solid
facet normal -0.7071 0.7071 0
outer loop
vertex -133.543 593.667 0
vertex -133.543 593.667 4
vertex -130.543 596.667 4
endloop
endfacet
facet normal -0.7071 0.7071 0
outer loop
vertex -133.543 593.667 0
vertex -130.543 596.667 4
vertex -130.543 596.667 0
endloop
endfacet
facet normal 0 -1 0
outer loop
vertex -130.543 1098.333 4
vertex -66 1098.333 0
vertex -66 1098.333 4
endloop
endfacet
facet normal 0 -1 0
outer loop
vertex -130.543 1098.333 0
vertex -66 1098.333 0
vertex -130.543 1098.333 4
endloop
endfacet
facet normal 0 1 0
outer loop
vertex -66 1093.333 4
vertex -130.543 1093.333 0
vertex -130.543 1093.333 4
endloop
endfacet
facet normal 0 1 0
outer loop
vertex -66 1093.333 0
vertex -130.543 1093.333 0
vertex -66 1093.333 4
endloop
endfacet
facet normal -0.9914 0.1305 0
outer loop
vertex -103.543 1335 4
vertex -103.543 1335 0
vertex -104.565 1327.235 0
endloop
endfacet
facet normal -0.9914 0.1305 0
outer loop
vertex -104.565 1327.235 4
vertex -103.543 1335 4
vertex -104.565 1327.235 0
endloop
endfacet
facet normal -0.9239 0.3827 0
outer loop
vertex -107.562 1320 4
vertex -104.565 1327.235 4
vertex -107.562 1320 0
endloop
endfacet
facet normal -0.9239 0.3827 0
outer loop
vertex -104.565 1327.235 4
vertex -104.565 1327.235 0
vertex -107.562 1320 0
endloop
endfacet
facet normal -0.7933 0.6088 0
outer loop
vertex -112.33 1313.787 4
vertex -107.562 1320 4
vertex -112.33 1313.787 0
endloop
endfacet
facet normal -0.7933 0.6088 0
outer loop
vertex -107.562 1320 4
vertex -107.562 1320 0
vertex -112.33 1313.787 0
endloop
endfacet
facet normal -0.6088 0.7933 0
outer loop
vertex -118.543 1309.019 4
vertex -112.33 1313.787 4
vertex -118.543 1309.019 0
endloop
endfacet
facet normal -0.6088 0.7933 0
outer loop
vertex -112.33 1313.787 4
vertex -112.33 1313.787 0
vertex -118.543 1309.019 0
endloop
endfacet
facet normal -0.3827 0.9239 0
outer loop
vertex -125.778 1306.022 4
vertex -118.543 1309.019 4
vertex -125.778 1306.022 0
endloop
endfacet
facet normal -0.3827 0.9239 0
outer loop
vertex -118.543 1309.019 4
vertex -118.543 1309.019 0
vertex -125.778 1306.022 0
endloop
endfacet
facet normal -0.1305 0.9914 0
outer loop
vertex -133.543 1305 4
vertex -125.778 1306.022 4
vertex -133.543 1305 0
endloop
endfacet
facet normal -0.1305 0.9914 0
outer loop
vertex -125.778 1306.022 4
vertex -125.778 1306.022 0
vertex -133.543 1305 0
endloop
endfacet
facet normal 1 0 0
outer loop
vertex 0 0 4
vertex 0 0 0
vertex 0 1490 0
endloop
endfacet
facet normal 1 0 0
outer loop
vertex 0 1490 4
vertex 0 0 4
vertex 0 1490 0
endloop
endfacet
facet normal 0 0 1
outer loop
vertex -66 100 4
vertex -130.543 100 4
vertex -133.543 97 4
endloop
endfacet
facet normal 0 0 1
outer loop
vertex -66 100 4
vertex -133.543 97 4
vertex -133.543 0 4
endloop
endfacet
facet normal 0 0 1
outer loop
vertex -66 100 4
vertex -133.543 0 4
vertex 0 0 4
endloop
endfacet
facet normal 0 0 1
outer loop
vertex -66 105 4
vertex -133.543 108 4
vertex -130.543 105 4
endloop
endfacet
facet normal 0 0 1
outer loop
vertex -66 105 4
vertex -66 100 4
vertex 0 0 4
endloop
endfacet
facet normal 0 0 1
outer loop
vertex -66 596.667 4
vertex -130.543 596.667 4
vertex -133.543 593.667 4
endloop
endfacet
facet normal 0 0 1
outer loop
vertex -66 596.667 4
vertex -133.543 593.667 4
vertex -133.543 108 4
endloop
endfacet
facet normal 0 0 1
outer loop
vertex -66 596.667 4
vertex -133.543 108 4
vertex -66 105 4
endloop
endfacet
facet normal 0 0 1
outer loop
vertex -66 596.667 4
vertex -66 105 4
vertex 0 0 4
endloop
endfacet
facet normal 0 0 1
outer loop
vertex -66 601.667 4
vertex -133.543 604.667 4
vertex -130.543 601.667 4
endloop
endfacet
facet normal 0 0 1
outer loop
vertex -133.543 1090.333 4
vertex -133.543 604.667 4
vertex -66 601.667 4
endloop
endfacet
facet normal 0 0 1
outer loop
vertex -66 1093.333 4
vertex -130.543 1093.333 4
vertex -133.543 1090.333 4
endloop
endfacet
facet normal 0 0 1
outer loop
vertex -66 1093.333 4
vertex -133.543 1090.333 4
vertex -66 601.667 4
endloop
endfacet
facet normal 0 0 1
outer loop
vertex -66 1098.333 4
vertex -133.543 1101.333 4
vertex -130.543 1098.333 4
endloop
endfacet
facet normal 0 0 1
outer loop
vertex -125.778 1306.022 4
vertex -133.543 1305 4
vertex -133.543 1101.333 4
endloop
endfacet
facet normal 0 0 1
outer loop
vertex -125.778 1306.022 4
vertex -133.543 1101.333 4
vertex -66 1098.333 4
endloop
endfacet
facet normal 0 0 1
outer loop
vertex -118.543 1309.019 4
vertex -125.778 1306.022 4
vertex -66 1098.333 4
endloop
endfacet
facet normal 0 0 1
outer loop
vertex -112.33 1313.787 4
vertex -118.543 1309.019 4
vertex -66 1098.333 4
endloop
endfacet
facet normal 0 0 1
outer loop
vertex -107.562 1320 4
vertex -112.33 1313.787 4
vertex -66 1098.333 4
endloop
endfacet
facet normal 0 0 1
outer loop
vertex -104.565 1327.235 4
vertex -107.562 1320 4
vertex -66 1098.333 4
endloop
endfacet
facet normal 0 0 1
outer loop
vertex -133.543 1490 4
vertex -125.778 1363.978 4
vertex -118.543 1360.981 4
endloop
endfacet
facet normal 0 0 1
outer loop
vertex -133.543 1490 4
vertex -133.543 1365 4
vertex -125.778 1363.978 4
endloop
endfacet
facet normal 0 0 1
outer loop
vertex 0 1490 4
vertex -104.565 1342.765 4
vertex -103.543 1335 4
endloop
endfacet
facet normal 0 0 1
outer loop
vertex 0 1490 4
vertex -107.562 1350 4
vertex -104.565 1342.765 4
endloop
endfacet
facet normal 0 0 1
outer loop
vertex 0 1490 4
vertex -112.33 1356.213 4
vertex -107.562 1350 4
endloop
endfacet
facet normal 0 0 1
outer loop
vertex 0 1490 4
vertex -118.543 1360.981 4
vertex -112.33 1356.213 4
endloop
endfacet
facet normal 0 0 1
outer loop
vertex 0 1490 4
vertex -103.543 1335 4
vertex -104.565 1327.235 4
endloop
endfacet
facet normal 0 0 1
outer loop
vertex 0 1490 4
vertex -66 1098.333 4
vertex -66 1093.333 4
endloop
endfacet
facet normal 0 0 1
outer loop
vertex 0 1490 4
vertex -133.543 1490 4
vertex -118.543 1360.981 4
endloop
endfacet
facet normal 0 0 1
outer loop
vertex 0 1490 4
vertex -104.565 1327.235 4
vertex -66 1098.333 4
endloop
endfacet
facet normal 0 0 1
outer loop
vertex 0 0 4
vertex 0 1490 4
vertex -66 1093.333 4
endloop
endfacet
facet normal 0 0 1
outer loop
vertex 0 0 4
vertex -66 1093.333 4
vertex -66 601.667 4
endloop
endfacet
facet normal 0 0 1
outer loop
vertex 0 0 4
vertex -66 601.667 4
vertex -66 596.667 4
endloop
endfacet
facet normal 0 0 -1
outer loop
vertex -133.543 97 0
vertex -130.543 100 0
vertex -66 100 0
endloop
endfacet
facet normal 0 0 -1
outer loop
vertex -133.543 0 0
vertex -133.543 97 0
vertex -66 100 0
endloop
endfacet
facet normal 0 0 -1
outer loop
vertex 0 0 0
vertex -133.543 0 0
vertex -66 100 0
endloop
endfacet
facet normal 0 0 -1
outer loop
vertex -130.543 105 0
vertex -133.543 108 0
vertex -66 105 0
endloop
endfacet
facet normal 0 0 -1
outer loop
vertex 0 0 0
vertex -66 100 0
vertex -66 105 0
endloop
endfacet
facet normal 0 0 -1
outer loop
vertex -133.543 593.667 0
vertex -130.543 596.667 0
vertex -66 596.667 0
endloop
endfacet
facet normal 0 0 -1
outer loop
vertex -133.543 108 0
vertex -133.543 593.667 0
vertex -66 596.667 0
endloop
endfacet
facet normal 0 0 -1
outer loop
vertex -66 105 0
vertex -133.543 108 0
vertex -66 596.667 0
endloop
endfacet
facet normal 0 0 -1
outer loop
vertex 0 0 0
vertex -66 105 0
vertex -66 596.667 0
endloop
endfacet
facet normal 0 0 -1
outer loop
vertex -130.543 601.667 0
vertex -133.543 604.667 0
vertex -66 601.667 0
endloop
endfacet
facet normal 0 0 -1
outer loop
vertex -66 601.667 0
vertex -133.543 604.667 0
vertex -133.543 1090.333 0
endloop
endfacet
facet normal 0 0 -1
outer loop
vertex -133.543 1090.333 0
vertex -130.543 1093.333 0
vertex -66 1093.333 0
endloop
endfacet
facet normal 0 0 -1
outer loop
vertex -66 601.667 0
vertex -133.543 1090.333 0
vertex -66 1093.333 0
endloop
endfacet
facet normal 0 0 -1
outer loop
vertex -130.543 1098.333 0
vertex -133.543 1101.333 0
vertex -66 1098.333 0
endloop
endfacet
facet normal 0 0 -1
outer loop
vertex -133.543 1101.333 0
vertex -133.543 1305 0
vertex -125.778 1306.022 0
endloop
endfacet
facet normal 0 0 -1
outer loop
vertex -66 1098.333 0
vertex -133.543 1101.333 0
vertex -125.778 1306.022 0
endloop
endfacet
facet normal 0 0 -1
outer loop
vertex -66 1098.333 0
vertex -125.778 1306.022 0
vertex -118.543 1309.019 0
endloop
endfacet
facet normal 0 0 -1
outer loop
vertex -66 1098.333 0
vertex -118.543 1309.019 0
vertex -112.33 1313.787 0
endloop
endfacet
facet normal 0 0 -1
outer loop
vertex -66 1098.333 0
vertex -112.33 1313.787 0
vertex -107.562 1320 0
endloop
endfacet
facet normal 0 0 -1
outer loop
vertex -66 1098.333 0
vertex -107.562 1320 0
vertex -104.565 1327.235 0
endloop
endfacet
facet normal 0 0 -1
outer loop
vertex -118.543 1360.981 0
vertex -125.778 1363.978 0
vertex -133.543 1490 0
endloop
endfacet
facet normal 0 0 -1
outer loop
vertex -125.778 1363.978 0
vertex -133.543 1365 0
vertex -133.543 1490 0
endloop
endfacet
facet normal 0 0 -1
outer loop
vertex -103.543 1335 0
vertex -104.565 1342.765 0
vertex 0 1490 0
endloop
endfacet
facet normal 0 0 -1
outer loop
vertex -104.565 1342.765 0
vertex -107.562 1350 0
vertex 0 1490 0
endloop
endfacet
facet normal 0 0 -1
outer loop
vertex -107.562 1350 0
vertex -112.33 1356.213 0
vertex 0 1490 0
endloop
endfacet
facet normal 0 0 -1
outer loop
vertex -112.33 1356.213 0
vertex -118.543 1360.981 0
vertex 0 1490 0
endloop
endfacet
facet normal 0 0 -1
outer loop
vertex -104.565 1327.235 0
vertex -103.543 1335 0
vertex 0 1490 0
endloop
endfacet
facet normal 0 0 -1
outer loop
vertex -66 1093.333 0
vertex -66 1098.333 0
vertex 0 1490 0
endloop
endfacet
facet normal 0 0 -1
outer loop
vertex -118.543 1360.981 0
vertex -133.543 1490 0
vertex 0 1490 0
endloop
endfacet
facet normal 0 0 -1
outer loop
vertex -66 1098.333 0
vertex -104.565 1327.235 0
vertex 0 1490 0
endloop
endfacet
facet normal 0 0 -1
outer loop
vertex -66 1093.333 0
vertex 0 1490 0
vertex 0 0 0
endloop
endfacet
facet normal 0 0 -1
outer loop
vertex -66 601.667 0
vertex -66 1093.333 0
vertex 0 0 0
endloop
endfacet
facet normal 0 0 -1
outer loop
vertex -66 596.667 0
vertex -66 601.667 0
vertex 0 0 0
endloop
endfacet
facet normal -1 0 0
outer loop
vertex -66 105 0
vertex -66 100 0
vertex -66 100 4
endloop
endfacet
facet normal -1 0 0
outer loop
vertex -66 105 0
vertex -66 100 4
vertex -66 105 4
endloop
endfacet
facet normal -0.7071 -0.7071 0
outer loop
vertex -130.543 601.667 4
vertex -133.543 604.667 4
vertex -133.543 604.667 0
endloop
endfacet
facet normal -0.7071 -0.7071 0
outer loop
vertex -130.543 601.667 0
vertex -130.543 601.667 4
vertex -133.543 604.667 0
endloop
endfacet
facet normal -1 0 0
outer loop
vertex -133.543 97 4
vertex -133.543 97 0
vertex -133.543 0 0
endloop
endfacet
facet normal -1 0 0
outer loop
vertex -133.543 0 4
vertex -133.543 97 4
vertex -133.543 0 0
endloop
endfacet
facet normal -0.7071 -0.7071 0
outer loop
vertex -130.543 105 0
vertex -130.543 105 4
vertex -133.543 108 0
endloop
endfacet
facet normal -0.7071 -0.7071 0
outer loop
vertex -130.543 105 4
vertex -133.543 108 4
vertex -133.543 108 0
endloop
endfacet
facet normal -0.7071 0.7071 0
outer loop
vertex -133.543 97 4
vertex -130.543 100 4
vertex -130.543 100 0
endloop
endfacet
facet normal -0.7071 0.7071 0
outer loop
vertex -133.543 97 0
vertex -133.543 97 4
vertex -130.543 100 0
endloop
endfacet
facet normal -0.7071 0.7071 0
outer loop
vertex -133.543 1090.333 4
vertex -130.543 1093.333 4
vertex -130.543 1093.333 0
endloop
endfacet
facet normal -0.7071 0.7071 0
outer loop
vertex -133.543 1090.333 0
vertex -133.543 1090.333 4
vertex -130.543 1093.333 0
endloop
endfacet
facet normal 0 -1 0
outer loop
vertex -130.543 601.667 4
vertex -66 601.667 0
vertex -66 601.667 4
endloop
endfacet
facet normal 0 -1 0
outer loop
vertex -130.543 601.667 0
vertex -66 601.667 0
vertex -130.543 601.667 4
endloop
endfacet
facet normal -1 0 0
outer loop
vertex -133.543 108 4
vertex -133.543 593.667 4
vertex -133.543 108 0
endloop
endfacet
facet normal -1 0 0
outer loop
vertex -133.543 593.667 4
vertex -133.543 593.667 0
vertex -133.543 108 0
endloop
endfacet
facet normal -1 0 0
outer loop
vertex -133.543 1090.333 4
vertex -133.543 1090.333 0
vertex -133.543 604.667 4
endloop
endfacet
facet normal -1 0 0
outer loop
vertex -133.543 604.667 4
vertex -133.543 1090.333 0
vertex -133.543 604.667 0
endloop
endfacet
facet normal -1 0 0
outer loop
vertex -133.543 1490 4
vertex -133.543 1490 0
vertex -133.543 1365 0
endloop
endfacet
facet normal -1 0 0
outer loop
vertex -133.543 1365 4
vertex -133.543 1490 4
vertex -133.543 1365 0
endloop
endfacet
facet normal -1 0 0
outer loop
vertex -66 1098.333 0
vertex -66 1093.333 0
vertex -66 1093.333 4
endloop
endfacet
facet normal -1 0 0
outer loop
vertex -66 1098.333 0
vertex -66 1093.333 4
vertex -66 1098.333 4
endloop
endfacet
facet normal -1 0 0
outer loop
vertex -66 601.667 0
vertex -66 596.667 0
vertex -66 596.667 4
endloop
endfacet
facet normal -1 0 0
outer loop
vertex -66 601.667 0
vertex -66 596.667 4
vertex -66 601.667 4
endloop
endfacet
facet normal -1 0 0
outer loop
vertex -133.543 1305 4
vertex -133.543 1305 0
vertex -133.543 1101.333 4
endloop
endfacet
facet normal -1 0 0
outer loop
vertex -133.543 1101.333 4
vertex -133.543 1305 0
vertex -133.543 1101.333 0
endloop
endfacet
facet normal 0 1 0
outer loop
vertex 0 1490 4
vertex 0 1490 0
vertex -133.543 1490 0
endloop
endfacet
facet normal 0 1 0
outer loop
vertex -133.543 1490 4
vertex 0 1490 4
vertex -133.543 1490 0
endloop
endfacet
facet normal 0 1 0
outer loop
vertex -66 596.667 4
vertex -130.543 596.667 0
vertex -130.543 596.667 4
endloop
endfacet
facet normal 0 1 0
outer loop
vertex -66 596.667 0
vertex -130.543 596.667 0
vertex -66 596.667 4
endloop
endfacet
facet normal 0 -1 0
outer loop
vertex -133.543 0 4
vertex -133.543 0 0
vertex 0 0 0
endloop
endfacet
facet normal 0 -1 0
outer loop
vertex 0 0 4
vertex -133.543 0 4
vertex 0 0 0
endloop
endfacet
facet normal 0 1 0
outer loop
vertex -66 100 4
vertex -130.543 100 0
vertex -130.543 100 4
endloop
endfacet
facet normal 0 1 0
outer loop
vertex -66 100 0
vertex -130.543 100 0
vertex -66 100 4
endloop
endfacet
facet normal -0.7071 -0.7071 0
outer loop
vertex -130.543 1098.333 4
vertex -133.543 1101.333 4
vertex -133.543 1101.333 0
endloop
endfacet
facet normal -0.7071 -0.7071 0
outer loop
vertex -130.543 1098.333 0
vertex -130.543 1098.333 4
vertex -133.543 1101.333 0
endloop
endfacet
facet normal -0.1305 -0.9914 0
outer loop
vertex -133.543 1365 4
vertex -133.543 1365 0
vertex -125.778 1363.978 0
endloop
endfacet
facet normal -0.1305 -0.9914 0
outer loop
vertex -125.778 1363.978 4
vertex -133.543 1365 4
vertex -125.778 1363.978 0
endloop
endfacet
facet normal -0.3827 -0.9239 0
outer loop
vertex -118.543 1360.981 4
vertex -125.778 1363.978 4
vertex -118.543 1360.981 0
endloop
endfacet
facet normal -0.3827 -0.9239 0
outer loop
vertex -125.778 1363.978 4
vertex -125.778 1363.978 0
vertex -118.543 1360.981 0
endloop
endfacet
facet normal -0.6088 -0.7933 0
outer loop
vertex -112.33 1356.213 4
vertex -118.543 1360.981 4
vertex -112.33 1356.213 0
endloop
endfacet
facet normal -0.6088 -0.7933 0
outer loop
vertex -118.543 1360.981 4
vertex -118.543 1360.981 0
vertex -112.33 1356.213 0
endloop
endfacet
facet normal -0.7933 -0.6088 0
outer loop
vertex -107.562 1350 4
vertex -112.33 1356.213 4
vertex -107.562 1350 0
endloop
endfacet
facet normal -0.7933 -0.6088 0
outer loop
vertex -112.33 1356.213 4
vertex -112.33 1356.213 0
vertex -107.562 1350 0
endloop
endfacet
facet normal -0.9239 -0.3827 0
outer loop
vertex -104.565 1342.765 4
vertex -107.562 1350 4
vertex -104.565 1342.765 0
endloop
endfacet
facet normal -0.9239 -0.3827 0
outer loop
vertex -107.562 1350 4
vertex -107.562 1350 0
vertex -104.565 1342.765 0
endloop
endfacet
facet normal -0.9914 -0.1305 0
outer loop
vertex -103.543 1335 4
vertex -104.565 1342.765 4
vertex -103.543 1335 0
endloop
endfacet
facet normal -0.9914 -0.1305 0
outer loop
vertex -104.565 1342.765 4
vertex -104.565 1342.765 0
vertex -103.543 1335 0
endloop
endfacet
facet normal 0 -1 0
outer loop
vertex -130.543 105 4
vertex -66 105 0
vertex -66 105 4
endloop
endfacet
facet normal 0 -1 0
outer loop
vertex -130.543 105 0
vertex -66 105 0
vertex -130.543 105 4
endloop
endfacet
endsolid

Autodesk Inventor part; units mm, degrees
ref_plane "YZ Plane" through (0, 0, 0) normal (1, 0, 0) x (0, 1, 0)
ref_plane "XZ Plane" through (0, 0, 0) normal (0, 1, 0) x (-1, 0, 0)
ref_plane "XY Plane" through (0, 0, 0) normal (0, 0, 1) x (1, 0, 0)
sketch "Sketch1" plane through (0, 0, 0) normal (0, 0, 1) x (1, 0, 0)
  line L0 (0, 1490) -> (-133.543, 1490)
  line L1 (-133.543, 1490) -> (-133.543, 0)
  line L2 (-133.543, 0) -> (0, 0)
  line L3 (0, 0) -> (0, 1490)
  line L4 (-133.543, 100) -> (-66, 100)
  line L5 (-66, 100) -> (-66, 105)
  line L6 (-66, 105) -> (-133.543, 105)
  line L7 (-133.543, 105) -> (-133.543, 100)
  line L8 (-133.543, 596.6667) -> (-66, 596.6667)
  line L9 (-66, 596.6667) -> (-66, 601.6667)
  line L10 (-66, 601.6667) -> (-133.543, 601.6667)
  line L11 (-133.543, 601.6667) -> (-133.543, 596.6667)
  line L12 (-133.543, 1093.3333) -> (-66, 1093.3333)
  line L13 (-66, 1093.3333) -> (-66, 1098.3333)
  line L14 (-66, 1098.3333) -> (-133.543, 1098.3333)
  line L15 (-133.543, 1098.3333) -> (-133.543, 1093.3333)
  circle A0 centre (-133.543, 1335) radius 30
  point P0 (-133.543, 105)
  point P1 (-133.543, 1365)
  point P2 (-133.543, 1305)
  dimension "d0" = 1490
  dimension "d1" = 133.543
  dimension "d2" = 5
  dimension "d4" = 100
  dimension "d7" = 496.6667
  dimension "d23" = 66
  dimension "d29" = 60
  dimension "d30" = 1335
extrude "Plate1" add sketch "Sketch1" along normal blind 4 contours L3 L2 L1 L4 L5 L6 L8 L9 L10 L12 L13 L14 A0 L0
chamfer "Corner Chamfer1" distance 3 angle 45 6 edges at (-133.543, 100, 2) (-133.543, 105, 2) (-133.543, 596.6667, 2) (-133.543, 601.6667, 2) (-133.543, 1098.3333, 2) (-133.543, 1093.3333, 2)
equation "\"d0\" = Стрингер_длина"
equation "\"d1\" = стрингер_глубина_6"
equation "\"d2\" = паз_под_стрингер_толщина"
equation "\"d7\" = Шаг_шпангоутов"
equation "\"d23\" = паз_под_стрингер_глубина - Thickness"
equation "\"d29\" = 2 * радиус_выреза_под_сварку"
equation "\"d12\" = Thickness"
equation "\"BendRadius\" = Thickness"
equation "\"BendReliefWidth\" = Thickness"
equation "\"BendReliefDepth\" = 0.5 * Thickness"
equation "\"CornerReliefSize\" = 4 * Thickness"
equation "\"MinimumRemnant\" = 2 * Thickness"
equation "\"TransitionRadius\" = BendRadius"
equation "\"JacobiRadiusSize\" = BendRadius"
equation "\"GapSize\" = Thickness"
equation "\"Стрингер_длина\" = 1490"
equation "\"стрингер_глубина_6\" = 133.543003"
equation "\"паз_под_стрингер_толщина\" = 5"
equation "\"Шаг_шпангоутов\" = 496.666667"
equation "\"паз_под_стрингер_глубина\" = 70"
equation "\"Thickness\" = 4"
equation "\"радиус_выреза_под_сварку\" = 30"
properties part number "0715 GBK stringer C3" material "Steel"
